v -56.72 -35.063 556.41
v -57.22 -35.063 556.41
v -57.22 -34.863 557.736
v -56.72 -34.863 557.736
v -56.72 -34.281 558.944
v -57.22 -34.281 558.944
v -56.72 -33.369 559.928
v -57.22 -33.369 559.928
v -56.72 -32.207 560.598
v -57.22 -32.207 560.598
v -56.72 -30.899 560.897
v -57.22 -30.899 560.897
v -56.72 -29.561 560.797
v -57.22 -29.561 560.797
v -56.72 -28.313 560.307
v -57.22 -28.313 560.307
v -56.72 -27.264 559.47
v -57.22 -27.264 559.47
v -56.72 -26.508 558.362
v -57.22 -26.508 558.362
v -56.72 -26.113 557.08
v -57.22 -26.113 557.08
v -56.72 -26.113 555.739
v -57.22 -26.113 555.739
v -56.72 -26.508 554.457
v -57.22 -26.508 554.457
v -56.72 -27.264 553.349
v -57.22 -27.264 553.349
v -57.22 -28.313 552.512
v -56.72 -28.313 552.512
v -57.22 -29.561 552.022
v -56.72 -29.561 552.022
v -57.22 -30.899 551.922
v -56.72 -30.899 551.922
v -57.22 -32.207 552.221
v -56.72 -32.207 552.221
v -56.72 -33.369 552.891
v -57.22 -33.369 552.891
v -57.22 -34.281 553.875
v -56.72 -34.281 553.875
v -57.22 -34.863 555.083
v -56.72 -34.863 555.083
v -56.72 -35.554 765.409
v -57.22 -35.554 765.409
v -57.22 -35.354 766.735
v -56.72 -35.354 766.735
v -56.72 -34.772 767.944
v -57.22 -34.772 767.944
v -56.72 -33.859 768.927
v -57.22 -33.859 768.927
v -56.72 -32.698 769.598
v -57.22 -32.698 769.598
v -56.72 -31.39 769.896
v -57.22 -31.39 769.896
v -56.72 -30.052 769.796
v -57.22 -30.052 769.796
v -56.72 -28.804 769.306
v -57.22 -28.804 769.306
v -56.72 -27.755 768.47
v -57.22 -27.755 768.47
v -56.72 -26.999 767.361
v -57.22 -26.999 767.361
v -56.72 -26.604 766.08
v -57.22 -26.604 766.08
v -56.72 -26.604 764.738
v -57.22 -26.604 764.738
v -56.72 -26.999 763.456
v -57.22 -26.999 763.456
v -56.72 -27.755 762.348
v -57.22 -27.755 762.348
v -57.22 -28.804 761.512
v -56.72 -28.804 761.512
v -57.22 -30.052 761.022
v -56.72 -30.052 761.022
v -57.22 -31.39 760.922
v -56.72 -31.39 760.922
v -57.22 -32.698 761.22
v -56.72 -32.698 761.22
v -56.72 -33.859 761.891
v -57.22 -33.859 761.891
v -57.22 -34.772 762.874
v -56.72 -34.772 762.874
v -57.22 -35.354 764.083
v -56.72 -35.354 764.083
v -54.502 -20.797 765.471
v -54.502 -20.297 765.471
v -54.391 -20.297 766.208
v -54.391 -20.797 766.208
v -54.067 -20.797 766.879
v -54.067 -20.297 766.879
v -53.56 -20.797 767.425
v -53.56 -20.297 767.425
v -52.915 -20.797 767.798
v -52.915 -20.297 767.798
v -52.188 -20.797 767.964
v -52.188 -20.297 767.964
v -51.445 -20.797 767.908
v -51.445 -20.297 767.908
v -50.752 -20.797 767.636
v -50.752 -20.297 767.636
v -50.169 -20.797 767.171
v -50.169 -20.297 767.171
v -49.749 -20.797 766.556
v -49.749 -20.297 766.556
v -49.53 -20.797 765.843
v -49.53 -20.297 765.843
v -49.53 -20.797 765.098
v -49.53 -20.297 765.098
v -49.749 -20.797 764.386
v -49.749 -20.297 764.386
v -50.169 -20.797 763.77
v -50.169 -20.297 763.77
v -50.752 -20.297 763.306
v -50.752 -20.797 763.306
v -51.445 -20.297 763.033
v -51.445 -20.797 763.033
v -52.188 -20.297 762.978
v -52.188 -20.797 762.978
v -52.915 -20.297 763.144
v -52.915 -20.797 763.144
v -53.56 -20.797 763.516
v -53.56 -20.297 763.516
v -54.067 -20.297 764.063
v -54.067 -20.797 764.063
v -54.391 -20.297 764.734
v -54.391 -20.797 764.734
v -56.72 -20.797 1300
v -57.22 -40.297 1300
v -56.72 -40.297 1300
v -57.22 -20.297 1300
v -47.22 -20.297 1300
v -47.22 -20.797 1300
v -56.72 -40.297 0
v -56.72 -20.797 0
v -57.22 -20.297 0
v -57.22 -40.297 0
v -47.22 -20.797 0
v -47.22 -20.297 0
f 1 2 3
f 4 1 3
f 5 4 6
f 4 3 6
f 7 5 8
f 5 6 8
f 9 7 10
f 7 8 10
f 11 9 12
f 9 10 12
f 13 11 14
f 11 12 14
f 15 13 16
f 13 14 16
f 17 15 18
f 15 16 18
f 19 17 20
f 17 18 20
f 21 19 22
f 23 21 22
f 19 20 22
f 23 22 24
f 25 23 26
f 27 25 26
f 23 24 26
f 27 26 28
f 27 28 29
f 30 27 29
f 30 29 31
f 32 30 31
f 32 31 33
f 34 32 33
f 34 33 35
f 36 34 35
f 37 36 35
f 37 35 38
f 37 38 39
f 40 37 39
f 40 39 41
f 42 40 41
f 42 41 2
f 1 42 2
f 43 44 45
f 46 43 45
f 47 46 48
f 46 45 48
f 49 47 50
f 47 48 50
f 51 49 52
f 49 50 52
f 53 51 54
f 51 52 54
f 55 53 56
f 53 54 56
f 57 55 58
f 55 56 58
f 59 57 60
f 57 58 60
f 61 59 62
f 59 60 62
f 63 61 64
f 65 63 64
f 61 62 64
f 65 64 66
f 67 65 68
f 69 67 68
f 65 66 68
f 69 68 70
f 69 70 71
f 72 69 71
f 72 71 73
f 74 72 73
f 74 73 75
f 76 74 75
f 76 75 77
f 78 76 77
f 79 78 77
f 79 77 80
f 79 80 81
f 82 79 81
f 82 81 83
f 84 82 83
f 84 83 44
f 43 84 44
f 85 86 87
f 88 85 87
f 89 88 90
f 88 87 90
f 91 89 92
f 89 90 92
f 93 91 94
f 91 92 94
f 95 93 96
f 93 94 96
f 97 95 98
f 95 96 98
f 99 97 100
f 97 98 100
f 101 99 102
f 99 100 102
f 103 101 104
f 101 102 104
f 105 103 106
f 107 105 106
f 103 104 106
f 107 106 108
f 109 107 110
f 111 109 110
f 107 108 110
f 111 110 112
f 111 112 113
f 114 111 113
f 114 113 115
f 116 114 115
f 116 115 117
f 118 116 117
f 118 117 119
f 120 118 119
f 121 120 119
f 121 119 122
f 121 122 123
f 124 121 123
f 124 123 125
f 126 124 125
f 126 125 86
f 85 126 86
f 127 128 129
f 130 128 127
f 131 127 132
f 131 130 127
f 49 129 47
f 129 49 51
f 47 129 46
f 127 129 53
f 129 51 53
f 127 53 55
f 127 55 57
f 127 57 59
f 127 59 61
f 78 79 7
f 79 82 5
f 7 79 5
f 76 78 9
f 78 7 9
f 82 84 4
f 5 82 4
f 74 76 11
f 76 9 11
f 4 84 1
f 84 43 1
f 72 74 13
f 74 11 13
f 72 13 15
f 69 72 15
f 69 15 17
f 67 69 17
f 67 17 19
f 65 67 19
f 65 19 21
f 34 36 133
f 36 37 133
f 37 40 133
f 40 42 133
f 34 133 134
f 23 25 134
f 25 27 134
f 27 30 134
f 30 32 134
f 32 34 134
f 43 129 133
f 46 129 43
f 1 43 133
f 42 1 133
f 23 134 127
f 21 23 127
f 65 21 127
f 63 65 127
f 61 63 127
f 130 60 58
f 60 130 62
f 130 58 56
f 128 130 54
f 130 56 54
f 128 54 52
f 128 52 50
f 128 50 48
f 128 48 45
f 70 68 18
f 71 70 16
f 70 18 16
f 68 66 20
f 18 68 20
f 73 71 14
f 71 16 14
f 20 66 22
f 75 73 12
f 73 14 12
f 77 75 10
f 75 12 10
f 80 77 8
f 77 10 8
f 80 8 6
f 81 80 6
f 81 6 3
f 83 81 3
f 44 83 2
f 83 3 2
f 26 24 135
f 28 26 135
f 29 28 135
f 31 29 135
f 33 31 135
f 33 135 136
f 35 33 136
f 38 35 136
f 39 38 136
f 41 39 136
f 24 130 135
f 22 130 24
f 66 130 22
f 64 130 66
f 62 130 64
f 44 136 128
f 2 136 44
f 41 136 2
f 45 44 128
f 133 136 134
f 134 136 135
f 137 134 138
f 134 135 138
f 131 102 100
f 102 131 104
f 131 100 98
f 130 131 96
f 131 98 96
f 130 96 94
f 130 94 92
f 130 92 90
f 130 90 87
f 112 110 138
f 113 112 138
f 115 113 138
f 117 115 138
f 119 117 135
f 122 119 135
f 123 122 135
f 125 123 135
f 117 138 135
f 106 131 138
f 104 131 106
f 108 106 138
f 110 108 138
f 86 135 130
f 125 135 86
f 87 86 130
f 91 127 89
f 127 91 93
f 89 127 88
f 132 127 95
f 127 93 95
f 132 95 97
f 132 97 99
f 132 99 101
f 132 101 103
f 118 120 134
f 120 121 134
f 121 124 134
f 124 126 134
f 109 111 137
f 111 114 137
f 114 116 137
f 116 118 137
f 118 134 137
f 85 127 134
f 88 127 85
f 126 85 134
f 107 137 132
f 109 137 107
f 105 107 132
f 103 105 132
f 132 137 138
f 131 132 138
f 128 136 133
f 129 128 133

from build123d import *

# Parameters (mm, degrees)
F0_W     = 0.5
F0_H     = 19.5
F0_H_2   = 0.5
F0_W_2   = 9.5
F1_DEPTH = 1300
F2_R     = 4.5
F3_DEPTH = 25
F4_R     = 2.5
F5_DEPTH = 25
F6_R     = 4.5
F7_DEPTH = 25


with BuildPart() as f1:
    # F0 (on Top) → F1 (new body)
    with BuildSketch(Plane.XY):
        with Locations((-56.969816, -30.547241)):
            Rectangle(F0_W, F0_H)
        with Locations((-56.969816, -20.547241)):
            Rectangle(F0_W, F0_H_2)
        with Locations((-51.969816, -20.547241)):
            Rectangle(F0_W_2, F0_H_2)
    extrude(amount=F1_DEPTH)

    # F2 (on face) → F3 (cut)
    with BuildSketch(Plane(origin=(-57.219816, 0, 0), x_dir=(0, -1, 0), z_dir=(-1, 0, 0))):
        with Locations((31.05364, 765.408933)):
            Circle(F2_R)
    extrude(amount=-F3_DEPTH, mode=Mode.SUBTRACT)

    # F4 (on face) → F5 (cut)
    with BuildSketch(Plane(origin=(0, -20.297241, 0), x_dir=(-1, 0, 0), z_dir=(0, 1, 0))):
        with Locations((52.001603, 765.470803)):
            Circle(F4_R)
    extrude(amount=-F5_DEPTH, mode=Mode.SUBTRACT)

    # F6 (on face) → F7 (cut)
    with BuildSketch(Plane(origin=(-57.219816, 0, 0), x_dir=(0, -1, 0), z_dir=(-1, 0, 0))):
        with Locations((30.562836, 556.409509)):
            Circle(F6_R)
    extrude(amount=-F7_DEPTH, mode=Mode.SUBTRACT)


solid = f1.part
